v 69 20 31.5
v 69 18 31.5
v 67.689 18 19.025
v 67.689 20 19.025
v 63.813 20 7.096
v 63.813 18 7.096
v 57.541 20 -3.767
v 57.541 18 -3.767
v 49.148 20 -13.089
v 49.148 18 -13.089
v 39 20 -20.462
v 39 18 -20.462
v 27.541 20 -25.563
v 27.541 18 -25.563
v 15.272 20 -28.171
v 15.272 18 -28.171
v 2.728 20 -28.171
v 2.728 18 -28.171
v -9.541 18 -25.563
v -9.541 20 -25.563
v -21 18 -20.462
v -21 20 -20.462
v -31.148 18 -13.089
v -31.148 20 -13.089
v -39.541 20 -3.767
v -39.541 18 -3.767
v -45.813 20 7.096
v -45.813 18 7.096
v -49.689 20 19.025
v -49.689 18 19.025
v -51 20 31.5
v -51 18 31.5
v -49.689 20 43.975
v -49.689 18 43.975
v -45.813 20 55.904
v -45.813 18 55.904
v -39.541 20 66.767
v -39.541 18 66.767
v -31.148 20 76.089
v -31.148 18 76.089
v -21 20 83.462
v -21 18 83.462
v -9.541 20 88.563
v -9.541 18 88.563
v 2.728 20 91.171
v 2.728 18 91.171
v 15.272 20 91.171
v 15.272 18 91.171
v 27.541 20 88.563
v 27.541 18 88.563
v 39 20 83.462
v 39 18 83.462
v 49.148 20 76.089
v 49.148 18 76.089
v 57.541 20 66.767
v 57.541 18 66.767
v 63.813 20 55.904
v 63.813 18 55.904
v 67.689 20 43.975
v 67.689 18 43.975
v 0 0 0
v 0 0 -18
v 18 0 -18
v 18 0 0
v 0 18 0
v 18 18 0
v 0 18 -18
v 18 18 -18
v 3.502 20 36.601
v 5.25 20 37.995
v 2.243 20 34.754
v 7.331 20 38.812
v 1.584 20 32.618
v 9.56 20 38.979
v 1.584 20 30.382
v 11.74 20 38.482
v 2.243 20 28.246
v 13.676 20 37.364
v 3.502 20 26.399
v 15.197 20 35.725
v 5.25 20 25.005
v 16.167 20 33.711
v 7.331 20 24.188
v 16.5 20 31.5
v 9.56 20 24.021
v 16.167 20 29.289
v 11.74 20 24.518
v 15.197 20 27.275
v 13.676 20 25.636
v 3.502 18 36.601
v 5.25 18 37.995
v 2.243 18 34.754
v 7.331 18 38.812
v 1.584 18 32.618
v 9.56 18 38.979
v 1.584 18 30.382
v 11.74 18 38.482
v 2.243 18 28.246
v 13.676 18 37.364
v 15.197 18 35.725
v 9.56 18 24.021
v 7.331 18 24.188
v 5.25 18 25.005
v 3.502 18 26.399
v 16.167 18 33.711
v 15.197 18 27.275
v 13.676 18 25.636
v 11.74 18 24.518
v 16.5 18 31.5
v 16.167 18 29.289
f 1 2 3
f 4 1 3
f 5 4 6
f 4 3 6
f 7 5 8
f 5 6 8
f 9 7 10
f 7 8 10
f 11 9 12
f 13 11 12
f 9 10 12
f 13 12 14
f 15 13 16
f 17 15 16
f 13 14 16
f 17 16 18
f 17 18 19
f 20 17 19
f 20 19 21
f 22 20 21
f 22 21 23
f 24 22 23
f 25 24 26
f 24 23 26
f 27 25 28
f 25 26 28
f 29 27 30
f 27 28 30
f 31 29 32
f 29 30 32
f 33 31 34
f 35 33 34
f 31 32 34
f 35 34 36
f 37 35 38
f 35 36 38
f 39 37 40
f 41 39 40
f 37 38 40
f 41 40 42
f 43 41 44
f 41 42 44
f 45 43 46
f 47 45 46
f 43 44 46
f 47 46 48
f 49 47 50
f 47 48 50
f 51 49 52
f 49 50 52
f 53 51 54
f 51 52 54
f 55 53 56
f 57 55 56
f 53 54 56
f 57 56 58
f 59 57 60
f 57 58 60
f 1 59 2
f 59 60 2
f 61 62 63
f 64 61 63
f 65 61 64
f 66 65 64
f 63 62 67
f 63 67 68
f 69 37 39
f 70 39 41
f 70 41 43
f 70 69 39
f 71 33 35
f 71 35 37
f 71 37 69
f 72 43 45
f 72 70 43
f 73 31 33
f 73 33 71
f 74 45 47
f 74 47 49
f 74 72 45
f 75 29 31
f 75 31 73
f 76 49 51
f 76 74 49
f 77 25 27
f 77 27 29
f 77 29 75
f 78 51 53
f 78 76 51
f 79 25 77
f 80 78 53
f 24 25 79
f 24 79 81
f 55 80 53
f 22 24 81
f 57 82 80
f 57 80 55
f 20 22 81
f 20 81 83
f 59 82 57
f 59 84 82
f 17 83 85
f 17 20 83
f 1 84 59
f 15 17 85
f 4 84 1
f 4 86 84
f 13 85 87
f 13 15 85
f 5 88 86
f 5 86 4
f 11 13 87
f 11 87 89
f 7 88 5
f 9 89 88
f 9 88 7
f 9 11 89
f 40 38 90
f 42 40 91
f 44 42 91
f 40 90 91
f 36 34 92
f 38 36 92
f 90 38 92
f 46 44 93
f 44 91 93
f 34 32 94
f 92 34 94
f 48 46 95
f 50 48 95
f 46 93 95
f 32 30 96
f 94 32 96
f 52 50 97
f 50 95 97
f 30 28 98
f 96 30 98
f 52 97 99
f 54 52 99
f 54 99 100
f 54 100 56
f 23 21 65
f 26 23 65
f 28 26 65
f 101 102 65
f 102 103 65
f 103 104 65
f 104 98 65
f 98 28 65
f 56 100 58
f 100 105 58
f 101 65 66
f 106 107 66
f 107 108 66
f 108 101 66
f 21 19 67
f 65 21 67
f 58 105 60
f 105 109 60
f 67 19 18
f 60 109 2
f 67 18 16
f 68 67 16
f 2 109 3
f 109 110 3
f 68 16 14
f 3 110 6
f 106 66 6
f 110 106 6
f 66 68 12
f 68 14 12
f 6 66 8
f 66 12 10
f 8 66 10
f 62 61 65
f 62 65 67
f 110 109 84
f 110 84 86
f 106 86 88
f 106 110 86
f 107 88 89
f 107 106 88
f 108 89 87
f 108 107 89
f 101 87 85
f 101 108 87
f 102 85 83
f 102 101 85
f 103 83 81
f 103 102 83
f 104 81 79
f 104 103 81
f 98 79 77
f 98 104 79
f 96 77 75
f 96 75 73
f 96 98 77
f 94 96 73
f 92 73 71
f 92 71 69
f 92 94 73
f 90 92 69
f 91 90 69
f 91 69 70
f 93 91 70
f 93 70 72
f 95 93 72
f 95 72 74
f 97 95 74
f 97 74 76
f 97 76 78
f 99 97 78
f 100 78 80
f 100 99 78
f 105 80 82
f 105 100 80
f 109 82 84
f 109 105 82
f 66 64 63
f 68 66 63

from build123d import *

# Parameters (mm, degrees)
ESQUISSE1_W      = 18
ESQUISSE1_H      = 18
EXTRUSION1_DEPTH = 18
ESQUISSE2_R      = 60
ESQUISSE2_R_2    = 7.5
EXTRUSION2_DEPTH = 2


with BuildPart() as part:
    # Esquisse1 → Extrusion1 (new body)
    with BuildSketch(Plane(origin=(0, 0, 0), x_dir=(1, 0, 0), z_dir=(0, 1, 0))):
        with Locations((9, 9)):
            Rectangle(ESQUISSE1_W, ESQUISSE1_H)
    extrude(amount=EXTRUSION1_DEPTH)

    # Esquisse2 → Extrusion2 (add)
    with BuildSketch(Plane(origin=(0, 18, 0), x_dir=(1, 0, 0), z_dir=(0, 1, 0))):
        with Locations((9, -31.5)):
            Circle(ESQUISSE2_R)
        with Locations((9, -31.5)):
            Circle(ESQUISSE2_R_2, mode=Mode.SUBTRACT)
    extrude(amount=EXTRUSION2_DEPTH)


solid = part.part
